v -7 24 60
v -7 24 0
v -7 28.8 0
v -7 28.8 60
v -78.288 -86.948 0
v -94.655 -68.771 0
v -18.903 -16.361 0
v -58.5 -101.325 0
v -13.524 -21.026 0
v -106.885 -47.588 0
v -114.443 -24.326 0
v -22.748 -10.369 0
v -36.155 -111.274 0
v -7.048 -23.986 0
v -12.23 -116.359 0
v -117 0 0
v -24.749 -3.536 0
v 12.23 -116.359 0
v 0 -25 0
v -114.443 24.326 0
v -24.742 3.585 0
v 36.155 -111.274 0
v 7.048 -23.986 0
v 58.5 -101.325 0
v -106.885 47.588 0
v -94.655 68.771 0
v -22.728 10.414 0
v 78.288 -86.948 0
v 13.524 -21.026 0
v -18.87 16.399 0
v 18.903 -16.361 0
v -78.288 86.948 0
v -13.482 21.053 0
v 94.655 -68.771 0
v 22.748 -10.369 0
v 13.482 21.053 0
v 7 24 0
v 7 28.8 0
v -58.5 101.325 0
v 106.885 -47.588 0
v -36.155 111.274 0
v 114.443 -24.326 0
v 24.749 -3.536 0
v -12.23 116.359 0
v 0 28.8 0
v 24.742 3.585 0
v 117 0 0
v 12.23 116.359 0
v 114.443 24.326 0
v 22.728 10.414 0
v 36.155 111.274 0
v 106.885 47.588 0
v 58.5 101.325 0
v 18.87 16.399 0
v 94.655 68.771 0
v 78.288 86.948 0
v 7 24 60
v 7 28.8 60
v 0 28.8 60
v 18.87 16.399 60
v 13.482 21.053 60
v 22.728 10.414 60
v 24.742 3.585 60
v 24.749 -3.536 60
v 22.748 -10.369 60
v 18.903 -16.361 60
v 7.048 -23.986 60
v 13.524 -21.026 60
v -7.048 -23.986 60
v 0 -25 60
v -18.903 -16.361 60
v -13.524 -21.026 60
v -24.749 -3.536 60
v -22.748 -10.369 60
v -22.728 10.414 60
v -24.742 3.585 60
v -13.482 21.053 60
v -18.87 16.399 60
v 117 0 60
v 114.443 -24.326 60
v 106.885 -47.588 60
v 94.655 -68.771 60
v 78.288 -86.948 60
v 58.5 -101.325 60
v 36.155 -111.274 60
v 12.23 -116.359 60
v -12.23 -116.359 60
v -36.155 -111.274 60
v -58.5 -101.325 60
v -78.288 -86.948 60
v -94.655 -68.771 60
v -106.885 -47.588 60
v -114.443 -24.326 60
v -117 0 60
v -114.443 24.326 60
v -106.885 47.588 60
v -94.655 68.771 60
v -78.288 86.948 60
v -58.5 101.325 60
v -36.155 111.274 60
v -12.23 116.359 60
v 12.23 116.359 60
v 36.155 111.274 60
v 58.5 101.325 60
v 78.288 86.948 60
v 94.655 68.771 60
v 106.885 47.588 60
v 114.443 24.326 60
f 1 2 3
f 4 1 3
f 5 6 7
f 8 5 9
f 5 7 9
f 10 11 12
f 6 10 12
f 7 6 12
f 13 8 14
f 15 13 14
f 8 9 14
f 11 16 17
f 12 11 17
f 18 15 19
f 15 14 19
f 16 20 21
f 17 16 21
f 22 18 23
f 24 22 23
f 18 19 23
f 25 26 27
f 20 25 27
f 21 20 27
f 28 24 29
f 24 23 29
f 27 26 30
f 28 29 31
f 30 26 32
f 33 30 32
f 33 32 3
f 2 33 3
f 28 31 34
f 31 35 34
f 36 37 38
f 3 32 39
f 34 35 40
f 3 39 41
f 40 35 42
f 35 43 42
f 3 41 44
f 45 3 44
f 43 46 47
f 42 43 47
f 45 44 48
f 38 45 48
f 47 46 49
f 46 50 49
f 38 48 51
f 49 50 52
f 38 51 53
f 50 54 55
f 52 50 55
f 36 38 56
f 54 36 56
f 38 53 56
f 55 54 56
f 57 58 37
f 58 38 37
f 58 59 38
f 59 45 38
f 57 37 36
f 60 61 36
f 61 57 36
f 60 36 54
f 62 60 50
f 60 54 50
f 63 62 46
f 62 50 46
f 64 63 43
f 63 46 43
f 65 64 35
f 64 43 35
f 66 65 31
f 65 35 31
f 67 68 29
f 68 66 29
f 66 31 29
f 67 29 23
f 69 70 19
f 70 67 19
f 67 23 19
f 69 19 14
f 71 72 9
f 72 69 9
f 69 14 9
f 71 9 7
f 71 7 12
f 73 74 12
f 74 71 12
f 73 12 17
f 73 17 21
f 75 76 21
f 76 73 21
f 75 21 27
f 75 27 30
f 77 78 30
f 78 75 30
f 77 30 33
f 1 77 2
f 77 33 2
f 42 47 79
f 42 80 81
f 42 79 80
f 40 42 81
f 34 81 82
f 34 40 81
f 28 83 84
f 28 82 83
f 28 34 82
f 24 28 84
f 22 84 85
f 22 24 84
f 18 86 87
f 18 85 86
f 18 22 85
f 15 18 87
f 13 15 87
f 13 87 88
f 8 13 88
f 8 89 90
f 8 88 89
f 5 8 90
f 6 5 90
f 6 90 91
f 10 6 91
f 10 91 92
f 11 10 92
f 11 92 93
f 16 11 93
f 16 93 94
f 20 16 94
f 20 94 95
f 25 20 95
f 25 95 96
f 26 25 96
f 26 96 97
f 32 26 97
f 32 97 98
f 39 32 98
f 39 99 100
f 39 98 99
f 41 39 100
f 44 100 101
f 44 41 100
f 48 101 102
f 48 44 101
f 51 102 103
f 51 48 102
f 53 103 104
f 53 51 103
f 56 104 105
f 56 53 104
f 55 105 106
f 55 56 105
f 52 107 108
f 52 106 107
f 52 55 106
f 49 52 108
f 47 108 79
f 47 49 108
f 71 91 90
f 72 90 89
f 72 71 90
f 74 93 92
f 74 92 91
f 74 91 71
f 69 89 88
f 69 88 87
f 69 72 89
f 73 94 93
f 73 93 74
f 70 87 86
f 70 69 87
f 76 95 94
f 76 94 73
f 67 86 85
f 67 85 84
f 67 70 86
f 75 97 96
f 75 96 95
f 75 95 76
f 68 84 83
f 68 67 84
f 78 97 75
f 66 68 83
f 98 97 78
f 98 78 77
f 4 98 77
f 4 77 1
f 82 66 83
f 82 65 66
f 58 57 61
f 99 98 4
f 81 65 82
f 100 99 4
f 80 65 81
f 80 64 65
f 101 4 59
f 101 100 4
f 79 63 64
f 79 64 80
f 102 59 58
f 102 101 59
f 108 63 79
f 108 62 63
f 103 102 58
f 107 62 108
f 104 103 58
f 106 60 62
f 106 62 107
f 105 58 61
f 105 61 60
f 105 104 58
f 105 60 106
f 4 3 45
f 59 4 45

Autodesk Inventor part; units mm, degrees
sketch "スケッチ1" plane through (0, 0, 0) normal (0, 0, 1) x (1, 0, 0)
  circle A0 centre (0, 0) radius 117
  arc A1 (-7, 24) -> (7, 24) centre (0, 0) ccw
  line L0 (0, 25) -> (0, 28.8)
  line L1 (0, 28.8) -> (0, 20)
  line L2 (0, 20) -> (-7, 20)
  line L3 (-7, 24) -> (-7, 28.8)
  line L4 (-7, 28.8) -> (7, 28.8)
  line L5 (7, 28.8) -> (7, 24)
  line L6 (7, 20) -> (0, 20)
  circle A2 centre (0, 0) radius 111 construction
  circle A3 centre (0, 0) radius 103.5 construction
  circle A4 centre (0, 0) radius 104.3059 construction
  dimension "d0" = 234
  dimension "d1" = 50
  dimension "d2" = 3.8
  dimension "d3" = 8.8
  dimension "d4" = 7
  dimension "d5" = 14
  dimension "d8" = 222
  dimension "d9" = 207
  dimension "d10" = 208.6117
extrude "押し出し1" add sketch "スケッチ1" along normal blind 60
properties part number "gear4"
